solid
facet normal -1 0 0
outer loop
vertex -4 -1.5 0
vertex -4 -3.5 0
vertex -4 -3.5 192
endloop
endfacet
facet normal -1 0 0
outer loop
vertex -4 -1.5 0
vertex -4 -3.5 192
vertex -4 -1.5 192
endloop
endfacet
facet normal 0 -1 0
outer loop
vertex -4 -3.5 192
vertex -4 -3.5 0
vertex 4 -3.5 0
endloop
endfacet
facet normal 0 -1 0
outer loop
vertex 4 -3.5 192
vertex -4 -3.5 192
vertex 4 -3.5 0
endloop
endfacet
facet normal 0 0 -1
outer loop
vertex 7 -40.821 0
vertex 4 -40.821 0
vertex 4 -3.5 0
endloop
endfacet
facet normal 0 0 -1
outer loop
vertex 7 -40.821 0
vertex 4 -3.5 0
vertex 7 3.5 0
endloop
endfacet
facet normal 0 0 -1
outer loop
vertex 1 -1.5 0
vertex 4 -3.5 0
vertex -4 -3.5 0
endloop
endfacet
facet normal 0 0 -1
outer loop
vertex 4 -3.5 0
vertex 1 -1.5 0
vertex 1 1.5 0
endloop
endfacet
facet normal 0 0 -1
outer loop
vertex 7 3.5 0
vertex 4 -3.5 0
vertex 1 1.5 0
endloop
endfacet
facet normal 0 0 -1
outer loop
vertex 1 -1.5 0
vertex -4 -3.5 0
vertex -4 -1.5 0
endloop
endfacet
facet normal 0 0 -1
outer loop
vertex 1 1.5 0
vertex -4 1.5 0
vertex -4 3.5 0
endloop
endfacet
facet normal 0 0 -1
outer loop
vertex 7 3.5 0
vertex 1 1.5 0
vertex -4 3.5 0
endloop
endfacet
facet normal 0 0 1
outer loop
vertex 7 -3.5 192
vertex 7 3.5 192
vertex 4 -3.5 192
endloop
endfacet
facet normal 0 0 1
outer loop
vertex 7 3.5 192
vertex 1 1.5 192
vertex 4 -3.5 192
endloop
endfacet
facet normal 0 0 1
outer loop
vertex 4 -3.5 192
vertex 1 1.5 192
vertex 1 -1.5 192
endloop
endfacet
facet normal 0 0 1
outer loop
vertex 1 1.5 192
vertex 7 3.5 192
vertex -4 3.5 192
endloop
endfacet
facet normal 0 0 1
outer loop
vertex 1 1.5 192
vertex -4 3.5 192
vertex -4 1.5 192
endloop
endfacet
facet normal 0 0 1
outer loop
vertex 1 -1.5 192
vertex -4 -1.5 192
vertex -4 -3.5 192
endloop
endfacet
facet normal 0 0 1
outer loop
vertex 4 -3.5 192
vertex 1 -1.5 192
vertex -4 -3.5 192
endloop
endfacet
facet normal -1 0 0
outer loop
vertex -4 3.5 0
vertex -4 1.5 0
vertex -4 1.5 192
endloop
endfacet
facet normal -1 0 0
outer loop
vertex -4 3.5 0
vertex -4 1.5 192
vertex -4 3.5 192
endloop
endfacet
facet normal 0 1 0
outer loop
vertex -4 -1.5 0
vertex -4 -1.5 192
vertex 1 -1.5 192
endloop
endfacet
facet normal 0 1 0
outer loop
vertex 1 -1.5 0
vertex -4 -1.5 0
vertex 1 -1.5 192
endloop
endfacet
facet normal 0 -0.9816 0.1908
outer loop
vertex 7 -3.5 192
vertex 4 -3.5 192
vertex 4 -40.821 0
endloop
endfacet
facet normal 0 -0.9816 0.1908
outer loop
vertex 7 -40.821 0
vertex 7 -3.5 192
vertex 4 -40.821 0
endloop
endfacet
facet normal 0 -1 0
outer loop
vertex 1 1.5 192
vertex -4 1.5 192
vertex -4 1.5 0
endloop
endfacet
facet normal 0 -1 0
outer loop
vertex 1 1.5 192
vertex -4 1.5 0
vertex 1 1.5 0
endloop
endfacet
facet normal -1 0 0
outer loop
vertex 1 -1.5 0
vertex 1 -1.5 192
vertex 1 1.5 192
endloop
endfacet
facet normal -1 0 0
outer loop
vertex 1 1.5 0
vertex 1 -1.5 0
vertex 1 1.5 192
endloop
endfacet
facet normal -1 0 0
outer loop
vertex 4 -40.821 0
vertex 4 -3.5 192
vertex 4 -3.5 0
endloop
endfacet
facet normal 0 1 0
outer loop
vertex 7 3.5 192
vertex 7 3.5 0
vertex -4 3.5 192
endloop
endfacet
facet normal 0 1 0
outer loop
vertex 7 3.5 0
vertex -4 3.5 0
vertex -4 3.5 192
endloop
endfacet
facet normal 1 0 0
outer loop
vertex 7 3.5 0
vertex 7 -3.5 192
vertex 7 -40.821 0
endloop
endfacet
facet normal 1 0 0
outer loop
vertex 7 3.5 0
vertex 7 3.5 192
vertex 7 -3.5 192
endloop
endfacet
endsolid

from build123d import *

# Parameters (mm, degrees)
SKETCH1_W           = 8
SKETCH1_H           = 7
BOSS_EXTRUDE1_DEPTH = 192
SKETCH2_W           = 5
SKETCH2_H           = 3
CUT_EXTRUDE1_DEPTH  = 192
BOSS_EXTRUDE2_DEPTH = 3


with BuildPart() as part:
    # Sketch1 → Boss-Extrude1 (new body)
    with BuildSketch(Plane.XY):
        Rectangle(SKETCH1_W, SKETCH1_H)
    extrude(amount=BOSS_EXTRUDE1_DEPTH)

    # Sketch2 → Cut-Extrude1 (cut)
    with BuildSketch(Plane.XY.offset(192)):
        with Locations((-1.5, 0)):
            Rectangle(SKETCH2_W, SKETCH2_H)
    extrude(amount=-CUT_EXTRUDE1_DEPTH, mode=Mode.SUBTRACT)

    # Sketch3 → Boss-Extrude2 (add)
    with BuildSketch(Plane(origin=(4, 0, 0), x_dir=(0, 0, -1), z_dir=(1, 0, 0))):
        Polygon((-192, -3.5), (0, -40.821019354), (0, -3.5), (0, 3.5), (-192, 3.5), align=None)
    extrude(amount=BOSS_EXTRUDE2_DEPTH)


solid = part.part
